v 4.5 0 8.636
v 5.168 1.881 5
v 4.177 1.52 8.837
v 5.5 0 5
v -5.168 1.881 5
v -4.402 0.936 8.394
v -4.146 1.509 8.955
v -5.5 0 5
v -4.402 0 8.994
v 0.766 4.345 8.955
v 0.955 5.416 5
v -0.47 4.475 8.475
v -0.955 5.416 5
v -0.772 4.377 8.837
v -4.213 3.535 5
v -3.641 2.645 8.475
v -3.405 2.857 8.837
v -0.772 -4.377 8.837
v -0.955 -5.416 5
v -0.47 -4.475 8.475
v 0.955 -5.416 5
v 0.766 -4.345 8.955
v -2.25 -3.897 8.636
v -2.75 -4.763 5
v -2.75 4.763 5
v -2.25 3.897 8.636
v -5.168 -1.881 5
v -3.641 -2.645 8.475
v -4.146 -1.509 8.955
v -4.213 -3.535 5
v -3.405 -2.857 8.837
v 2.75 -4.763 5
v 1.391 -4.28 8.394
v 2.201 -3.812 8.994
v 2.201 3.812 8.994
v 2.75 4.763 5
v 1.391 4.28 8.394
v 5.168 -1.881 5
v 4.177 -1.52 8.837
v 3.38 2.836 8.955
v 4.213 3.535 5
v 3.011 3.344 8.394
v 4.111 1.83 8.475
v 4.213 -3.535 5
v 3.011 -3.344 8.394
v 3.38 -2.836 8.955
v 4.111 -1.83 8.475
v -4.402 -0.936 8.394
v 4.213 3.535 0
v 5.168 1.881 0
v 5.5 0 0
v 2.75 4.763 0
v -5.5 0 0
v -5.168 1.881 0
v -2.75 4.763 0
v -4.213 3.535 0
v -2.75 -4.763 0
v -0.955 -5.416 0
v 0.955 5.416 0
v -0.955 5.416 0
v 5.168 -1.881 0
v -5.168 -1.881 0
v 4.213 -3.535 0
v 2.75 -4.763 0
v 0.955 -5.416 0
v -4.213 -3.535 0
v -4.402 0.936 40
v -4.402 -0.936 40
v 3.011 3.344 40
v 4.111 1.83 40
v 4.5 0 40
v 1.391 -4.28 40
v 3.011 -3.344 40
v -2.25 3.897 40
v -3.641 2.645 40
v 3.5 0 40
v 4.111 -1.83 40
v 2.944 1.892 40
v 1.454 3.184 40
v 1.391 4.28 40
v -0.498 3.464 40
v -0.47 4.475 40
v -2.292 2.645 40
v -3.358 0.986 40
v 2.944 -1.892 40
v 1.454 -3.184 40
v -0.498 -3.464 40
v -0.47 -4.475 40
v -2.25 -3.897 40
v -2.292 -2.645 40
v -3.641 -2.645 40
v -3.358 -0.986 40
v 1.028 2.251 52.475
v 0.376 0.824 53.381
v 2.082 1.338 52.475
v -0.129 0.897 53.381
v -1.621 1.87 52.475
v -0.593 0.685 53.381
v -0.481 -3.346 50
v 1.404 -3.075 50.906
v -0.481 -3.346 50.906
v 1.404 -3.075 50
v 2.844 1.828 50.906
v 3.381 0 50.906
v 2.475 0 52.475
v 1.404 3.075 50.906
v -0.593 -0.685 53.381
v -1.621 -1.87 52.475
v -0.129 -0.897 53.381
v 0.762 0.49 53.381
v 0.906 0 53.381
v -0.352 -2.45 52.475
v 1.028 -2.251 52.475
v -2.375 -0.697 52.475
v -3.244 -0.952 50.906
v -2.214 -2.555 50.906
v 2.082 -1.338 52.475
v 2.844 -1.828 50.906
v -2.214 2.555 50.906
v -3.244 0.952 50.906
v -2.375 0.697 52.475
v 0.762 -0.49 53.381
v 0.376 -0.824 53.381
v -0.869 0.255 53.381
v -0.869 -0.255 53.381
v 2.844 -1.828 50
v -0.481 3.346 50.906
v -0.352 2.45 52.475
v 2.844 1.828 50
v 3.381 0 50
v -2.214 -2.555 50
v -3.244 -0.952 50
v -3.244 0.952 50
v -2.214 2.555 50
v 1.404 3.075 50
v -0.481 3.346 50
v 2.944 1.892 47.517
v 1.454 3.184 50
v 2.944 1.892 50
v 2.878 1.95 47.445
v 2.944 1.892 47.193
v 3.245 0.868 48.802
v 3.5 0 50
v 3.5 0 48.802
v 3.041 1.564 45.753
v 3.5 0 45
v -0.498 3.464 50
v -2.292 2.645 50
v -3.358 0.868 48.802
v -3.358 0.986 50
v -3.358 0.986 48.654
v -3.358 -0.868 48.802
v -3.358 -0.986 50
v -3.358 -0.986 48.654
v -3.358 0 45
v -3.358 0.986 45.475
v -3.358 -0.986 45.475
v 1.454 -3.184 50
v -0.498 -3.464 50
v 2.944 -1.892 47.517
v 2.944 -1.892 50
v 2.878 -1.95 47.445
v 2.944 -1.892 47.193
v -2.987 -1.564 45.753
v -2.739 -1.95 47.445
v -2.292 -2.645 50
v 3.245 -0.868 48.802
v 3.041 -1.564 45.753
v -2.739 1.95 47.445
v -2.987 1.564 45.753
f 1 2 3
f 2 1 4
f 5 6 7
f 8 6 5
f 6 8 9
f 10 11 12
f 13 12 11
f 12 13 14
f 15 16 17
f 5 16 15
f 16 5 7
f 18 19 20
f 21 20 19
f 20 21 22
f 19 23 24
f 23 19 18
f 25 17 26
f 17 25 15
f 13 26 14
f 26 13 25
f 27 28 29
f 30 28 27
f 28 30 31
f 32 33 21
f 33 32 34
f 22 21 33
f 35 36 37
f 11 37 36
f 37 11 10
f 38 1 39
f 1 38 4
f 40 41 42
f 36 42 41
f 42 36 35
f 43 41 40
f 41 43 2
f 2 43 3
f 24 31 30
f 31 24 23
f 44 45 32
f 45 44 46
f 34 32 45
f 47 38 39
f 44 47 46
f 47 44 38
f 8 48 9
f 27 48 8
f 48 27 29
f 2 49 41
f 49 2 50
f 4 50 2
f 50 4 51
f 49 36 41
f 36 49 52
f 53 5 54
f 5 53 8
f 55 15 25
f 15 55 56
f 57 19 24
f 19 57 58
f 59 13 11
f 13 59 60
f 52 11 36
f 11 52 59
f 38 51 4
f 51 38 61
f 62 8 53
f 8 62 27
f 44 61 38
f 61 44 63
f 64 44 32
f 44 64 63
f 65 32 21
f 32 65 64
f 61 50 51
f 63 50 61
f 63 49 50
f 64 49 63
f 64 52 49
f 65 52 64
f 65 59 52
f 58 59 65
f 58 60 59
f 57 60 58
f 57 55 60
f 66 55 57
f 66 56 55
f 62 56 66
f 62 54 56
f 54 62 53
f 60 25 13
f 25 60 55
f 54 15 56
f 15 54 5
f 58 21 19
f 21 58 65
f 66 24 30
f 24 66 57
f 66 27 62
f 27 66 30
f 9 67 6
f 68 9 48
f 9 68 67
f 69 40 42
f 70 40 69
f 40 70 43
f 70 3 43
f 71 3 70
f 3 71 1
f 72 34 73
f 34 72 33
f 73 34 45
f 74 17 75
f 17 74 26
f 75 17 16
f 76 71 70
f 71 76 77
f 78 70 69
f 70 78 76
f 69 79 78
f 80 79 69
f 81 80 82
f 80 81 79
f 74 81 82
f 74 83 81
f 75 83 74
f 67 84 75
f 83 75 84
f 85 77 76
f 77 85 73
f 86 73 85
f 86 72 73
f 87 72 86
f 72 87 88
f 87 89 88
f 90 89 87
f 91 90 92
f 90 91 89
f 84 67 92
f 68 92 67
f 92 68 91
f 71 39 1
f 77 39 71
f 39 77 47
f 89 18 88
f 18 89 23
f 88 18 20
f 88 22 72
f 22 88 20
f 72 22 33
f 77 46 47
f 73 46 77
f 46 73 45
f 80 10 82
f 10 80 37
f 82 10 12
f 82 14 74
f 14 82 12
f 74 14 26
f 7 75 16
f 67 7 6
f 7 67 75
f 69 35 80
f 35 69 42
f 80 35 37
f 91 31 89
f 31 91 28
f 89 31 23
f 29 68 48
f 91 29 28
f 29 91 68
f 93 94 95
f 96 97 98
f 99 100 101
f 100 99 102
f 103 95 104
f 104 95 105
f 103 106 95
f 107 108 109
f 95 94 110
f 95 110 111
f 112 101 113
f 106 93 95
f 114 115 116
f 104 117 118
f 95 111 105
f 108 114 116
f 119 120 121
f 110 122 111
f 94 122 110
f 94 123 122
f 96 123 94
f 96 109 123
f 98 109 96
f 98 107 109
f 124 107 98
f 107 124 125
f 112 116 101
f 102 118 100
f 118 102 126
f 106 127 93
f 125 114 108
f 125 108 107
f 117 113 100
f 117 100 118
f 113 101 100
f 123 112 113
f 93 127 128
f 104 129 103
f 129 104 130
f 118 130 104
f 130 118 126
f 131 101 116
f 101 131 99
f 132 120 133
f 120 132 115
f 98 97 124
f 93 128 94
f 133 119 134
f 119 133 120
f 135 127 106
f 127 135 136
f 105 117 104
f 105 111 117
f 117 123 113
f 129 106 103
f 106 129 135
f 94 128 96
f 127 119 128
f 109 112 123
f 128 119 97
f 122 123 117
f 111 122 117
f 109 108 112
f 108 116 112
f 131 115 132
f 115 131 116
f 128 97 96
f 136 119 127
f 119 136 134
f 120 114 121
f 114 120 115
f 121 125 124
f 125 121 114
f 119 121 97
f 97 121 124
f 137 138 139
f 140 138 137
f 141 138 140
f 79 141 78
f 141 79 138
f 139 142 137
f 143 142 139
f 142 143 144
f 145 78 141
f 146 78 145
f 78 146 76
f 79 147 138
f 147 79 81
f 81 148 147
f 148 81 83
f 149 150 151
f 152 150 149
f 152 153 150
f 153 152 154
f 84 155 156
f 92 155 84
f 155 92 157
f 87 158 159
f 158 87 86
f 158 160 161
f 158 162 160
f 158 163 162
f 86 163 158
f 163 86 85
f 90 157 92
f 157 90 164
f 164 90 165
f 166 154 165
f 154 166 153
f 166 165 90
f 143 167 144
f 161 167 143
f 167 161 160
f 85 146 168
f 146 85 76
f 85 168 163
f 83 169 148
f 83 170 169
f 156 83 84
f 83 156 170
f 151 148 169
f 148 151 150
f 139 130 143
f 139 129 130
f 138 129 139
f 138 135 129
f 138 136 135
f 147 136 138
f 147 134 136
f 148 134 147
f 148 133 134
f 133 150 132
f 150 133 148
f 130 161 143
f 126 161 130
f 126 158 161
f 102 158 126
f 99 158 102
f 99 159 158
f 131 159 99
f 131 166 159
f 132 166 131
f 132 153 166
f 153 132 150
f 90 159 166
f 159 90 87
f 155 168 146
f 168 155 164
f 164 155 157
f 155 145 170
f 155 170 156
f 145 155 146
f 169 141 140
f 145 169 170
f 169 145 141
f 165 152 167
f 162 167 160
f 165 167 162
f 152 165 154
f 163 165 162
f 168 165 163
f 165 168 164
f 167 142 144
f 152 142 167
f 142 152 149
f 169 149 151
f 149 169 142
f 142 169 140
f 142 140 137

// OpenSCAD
//difference() {
//union() {
//    difference() {
//        cylinder(80,d1=15,d2=15);
//        translate([0,0,2])cylinder(80,d1=13,d2=13);
//        translate([0,0,-3])cylinder(85,d1=6,d2=6);
//    }
//
//    translate([-5,14,37.5]) cube([3,18,75],true);
//    translate([2,22.5,37.5]) cube([14,1,75],true);
//}
//rotate([90,0,0]) translate([0,5,0])cylinder(75,2,2,true);
//rotate([90,0,0]) translate([0,35,0])cylinder(75,2,2,true);
//rotate([0,90,0]) translate([-75,0,0])cylinder(75,2.5,2.5,true);
//}
//difference() {
//rotate([90,0,0]) translate([8,35,0])cylinder(5,2,2,true);
//rotate([0,0,90]) translate([0,-10,35])cylinder(5,1,1,true);
//}
difference() {
union() {
translate([0,0,5])cylinder(20,d1=11,d2=0);
cylinder(5,d1=11,d2=11);
cylinder(40,d=9);
    translate([0,0,50]) sphere(r=3.5);
translate([0,0,0]) cylinder(50,d1=7,d2=7);


}
translate([-5,0,47])rotate([0,90,0])cylinder(10,2,2);
}
